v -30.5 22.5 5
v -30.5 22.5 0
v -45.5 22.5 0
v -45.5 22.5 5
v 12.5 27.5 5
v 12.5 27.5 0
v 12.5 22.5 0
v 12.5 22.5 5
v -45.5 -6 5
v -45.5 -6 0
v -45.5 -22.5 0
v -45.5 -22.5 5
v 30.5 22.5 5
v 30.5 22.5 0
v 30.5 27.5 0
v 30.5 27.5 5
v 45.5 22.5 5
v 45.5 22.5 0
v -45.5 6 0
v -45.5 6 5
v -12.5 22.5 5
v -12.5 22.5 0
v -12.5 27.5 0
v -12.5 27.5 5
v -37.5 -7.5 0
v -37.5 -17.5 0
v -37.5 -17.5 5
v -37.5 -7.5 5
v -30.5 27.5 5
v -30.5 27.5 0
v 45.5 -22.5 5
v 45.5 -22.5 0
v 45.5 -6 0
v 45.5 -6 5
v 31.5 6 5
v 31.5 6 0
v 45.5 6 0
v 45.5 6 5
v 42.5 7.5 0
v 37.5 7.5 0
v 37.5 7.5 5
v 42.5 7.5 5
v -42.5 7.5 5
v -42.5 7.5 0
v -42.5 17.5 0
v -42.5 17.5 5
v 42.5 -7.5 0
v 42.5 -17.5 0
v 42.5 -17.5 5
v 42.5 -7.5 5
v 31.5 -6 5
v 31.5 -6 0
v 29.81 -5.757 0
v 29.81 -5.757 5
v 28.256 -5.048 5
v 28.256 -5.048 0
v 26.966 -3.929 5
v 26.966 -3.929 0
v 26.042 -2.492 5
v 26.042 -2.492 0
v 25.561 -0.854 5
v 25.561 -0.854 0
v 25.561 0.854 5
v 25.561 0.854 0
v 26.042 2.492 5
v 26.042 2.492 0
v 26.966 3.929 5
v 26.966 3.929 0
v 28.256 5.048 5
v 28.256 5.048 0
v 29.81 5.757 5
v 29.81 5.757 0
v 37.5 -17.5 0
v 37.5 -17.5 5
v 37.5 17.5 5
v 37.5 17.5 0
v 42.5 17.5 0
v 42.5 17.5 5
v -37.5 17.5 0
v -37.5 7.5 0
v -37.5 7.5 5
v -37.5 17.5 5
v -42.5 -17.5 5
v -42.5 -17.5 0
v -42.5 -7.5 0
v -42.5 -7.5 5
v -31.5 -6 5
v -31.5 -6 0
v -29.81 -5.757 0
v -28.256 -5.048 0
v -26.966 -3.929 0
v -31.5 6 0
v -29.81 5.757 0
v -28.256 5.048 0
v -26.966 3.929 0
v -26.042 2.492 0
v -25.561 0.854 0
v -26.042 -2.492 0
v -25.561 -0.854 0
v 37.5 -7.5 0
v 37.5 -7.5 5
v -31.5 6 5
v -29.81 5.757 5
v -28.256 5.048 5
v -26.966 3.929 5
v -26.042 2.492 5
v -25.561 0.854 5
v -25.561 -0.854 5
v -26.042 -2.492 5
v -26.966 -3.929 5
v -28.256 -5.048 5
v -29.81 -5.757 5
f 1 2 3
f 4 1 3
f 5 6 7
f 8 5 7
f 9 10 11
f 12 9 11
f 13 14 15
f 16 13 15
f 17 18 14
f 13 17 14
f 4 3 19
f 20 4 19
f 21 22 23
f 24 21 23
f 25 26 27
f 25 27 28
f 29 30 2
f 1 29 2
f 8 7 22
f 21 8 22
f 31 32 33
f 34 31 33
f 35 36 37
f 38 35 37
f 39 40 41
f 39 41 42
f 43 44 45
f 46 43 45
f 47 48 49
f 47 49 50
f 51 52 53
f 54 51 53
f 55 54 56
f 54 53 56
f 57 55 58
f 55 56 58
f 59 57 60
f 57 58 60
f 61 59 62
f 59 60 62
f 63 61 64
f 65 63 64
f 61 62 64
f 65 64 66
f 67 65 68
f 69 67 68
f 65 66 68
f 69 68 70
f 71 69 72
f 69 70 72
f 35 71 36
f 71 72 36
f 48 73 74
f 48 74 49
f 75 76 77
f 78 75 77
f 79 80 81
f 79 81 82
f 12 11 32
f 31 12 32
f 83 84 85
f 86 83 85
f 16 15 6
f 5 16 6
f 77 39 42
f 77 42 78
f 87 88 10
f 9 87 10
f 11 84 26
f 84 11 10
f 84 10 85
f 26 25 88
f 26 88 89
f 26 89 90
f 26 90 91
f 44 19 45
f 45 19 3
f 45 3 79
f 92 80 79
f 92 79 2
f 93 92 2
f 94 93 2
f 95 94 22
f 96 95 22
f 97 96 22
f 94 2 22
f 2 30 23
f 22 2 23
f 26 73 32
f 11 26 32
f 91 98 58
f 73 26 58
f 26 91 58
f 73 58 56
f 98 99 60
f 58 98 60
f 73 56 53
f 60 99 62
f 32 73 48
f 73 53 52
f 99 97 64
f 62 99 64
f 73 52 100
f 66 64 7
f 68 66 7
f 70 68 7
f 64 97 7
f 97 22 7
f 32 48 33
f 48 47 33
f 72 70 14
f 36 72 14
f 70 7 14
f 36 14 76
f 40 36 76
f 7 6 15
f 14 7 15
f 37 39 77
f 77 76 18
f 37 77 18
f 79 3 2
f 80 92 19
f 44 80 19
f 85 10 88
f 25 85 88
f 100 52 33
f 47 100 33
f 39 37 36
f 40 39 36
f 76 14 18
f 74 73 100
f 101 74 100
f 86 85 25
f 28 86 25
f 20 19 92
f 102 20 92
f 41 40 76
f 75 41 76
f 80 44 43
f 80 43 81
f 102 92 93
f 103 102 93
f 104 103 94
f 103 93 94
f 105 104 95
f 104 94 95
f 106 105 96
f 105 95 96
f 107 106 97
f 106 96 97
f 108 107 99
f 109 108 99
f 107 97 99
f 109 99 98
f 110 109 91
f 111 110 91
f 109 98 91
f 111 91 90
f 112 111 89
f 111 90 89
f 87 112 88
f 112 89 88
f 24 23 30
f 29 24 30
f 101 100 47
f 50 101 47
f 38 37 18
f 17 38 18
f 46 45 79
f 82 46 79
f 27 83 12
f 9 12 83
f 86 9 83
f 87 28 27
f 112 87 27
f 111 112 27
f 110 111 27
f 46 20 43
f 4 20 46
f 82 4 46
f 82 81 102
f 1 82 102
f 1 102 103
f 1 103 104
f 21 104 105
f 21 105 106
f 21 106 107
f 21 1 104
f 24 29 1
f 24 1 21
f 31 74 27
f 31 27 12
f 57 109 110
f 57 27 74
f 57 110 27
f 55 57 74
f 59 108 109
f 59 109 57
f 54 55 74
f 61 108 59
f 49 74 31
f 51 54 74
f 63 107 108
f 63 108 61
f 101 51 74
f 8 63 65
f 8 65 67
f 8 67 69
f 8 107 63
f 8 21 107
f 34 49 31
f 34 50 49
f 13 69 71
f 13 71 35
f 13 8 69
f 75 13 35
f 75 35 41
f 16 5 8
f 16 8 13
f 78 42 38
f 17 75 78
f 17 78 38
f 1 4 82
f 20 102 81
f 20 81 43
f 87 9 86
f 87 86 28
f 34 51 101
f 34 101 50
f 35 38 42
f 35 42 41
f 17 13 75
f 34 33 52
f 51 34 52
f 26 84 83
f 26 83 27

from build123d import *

# Parameters (mm, degrees)
F0_W     = 5
F0_H     = 10
F1_DEPTH = 5


with BuildPart() as f1:
    # F0 (on Top) → F1 (new body)
    with BuildSketch(Plane.XY):
        with BuildLine():
            Line((-30.5, 22.5), (-45.5, 22.5))
            Line((-45.5, 22.5), (-45.5, 6))
            Line((-45.5, 6), (-31.5, 6))
            ThreePointArc((-31.5, 6), (-25.5, 0), (-31.5, -6))
            Line((-31.5, -6), (-45.5, -6))
            Line((-45.5, -6), (-45.5, -22.5))
            Line((-45.5, -22.5), (45.5, -22.5))
            Line((45.5, -22.5), (45.5, -6))
            Line((45.5, -6), (31.5, -6))
            ThreePointArc((31.5, -6), (25.5, 0), (31.5, 6))
            Line((31.5, 6), (45.5, 6))
            Line((45.5, 6), (45.5, 22.5))
            Line((45.5, 22.5), (30.5, 22.5))
            Line((30.5, 22.5), (30.5, 27.5))
            Line((30.5, 27.5), (12.5, 27.5))
            Line((12.5, 27.5), (12.5, 22.5))
            Line((12.5, 22.5), (-12.5, 22.5))
            Line((-12.5, 22.5), (-12.5, 27.5))
            Line((-12.5, 27.5), (-30.5, 27.5))
            Line((-30.5, 27.5), (-30.5, 22.5))
        make_face()
        with Locations((-40, -12.5)):
            Rectangle(F0_W, F0_H, mode=Mode.SUBTRACT)
        with Locations((40, -12.5)):
            Rectangle(F0_W, F0_H, mode=Mode.SUBTRACT)
        with Locations((-40, 12.5)):
            Rectangle(F0_W, F0_H, mode=Mode.SUBTRACT)
        with Locations((40, 12.5)):
            Rectangle(F0_W, F0_H, mode=Mode.SUBTRACT)
    extrude(amount=F1_DEPTH)


solid = f1.part
